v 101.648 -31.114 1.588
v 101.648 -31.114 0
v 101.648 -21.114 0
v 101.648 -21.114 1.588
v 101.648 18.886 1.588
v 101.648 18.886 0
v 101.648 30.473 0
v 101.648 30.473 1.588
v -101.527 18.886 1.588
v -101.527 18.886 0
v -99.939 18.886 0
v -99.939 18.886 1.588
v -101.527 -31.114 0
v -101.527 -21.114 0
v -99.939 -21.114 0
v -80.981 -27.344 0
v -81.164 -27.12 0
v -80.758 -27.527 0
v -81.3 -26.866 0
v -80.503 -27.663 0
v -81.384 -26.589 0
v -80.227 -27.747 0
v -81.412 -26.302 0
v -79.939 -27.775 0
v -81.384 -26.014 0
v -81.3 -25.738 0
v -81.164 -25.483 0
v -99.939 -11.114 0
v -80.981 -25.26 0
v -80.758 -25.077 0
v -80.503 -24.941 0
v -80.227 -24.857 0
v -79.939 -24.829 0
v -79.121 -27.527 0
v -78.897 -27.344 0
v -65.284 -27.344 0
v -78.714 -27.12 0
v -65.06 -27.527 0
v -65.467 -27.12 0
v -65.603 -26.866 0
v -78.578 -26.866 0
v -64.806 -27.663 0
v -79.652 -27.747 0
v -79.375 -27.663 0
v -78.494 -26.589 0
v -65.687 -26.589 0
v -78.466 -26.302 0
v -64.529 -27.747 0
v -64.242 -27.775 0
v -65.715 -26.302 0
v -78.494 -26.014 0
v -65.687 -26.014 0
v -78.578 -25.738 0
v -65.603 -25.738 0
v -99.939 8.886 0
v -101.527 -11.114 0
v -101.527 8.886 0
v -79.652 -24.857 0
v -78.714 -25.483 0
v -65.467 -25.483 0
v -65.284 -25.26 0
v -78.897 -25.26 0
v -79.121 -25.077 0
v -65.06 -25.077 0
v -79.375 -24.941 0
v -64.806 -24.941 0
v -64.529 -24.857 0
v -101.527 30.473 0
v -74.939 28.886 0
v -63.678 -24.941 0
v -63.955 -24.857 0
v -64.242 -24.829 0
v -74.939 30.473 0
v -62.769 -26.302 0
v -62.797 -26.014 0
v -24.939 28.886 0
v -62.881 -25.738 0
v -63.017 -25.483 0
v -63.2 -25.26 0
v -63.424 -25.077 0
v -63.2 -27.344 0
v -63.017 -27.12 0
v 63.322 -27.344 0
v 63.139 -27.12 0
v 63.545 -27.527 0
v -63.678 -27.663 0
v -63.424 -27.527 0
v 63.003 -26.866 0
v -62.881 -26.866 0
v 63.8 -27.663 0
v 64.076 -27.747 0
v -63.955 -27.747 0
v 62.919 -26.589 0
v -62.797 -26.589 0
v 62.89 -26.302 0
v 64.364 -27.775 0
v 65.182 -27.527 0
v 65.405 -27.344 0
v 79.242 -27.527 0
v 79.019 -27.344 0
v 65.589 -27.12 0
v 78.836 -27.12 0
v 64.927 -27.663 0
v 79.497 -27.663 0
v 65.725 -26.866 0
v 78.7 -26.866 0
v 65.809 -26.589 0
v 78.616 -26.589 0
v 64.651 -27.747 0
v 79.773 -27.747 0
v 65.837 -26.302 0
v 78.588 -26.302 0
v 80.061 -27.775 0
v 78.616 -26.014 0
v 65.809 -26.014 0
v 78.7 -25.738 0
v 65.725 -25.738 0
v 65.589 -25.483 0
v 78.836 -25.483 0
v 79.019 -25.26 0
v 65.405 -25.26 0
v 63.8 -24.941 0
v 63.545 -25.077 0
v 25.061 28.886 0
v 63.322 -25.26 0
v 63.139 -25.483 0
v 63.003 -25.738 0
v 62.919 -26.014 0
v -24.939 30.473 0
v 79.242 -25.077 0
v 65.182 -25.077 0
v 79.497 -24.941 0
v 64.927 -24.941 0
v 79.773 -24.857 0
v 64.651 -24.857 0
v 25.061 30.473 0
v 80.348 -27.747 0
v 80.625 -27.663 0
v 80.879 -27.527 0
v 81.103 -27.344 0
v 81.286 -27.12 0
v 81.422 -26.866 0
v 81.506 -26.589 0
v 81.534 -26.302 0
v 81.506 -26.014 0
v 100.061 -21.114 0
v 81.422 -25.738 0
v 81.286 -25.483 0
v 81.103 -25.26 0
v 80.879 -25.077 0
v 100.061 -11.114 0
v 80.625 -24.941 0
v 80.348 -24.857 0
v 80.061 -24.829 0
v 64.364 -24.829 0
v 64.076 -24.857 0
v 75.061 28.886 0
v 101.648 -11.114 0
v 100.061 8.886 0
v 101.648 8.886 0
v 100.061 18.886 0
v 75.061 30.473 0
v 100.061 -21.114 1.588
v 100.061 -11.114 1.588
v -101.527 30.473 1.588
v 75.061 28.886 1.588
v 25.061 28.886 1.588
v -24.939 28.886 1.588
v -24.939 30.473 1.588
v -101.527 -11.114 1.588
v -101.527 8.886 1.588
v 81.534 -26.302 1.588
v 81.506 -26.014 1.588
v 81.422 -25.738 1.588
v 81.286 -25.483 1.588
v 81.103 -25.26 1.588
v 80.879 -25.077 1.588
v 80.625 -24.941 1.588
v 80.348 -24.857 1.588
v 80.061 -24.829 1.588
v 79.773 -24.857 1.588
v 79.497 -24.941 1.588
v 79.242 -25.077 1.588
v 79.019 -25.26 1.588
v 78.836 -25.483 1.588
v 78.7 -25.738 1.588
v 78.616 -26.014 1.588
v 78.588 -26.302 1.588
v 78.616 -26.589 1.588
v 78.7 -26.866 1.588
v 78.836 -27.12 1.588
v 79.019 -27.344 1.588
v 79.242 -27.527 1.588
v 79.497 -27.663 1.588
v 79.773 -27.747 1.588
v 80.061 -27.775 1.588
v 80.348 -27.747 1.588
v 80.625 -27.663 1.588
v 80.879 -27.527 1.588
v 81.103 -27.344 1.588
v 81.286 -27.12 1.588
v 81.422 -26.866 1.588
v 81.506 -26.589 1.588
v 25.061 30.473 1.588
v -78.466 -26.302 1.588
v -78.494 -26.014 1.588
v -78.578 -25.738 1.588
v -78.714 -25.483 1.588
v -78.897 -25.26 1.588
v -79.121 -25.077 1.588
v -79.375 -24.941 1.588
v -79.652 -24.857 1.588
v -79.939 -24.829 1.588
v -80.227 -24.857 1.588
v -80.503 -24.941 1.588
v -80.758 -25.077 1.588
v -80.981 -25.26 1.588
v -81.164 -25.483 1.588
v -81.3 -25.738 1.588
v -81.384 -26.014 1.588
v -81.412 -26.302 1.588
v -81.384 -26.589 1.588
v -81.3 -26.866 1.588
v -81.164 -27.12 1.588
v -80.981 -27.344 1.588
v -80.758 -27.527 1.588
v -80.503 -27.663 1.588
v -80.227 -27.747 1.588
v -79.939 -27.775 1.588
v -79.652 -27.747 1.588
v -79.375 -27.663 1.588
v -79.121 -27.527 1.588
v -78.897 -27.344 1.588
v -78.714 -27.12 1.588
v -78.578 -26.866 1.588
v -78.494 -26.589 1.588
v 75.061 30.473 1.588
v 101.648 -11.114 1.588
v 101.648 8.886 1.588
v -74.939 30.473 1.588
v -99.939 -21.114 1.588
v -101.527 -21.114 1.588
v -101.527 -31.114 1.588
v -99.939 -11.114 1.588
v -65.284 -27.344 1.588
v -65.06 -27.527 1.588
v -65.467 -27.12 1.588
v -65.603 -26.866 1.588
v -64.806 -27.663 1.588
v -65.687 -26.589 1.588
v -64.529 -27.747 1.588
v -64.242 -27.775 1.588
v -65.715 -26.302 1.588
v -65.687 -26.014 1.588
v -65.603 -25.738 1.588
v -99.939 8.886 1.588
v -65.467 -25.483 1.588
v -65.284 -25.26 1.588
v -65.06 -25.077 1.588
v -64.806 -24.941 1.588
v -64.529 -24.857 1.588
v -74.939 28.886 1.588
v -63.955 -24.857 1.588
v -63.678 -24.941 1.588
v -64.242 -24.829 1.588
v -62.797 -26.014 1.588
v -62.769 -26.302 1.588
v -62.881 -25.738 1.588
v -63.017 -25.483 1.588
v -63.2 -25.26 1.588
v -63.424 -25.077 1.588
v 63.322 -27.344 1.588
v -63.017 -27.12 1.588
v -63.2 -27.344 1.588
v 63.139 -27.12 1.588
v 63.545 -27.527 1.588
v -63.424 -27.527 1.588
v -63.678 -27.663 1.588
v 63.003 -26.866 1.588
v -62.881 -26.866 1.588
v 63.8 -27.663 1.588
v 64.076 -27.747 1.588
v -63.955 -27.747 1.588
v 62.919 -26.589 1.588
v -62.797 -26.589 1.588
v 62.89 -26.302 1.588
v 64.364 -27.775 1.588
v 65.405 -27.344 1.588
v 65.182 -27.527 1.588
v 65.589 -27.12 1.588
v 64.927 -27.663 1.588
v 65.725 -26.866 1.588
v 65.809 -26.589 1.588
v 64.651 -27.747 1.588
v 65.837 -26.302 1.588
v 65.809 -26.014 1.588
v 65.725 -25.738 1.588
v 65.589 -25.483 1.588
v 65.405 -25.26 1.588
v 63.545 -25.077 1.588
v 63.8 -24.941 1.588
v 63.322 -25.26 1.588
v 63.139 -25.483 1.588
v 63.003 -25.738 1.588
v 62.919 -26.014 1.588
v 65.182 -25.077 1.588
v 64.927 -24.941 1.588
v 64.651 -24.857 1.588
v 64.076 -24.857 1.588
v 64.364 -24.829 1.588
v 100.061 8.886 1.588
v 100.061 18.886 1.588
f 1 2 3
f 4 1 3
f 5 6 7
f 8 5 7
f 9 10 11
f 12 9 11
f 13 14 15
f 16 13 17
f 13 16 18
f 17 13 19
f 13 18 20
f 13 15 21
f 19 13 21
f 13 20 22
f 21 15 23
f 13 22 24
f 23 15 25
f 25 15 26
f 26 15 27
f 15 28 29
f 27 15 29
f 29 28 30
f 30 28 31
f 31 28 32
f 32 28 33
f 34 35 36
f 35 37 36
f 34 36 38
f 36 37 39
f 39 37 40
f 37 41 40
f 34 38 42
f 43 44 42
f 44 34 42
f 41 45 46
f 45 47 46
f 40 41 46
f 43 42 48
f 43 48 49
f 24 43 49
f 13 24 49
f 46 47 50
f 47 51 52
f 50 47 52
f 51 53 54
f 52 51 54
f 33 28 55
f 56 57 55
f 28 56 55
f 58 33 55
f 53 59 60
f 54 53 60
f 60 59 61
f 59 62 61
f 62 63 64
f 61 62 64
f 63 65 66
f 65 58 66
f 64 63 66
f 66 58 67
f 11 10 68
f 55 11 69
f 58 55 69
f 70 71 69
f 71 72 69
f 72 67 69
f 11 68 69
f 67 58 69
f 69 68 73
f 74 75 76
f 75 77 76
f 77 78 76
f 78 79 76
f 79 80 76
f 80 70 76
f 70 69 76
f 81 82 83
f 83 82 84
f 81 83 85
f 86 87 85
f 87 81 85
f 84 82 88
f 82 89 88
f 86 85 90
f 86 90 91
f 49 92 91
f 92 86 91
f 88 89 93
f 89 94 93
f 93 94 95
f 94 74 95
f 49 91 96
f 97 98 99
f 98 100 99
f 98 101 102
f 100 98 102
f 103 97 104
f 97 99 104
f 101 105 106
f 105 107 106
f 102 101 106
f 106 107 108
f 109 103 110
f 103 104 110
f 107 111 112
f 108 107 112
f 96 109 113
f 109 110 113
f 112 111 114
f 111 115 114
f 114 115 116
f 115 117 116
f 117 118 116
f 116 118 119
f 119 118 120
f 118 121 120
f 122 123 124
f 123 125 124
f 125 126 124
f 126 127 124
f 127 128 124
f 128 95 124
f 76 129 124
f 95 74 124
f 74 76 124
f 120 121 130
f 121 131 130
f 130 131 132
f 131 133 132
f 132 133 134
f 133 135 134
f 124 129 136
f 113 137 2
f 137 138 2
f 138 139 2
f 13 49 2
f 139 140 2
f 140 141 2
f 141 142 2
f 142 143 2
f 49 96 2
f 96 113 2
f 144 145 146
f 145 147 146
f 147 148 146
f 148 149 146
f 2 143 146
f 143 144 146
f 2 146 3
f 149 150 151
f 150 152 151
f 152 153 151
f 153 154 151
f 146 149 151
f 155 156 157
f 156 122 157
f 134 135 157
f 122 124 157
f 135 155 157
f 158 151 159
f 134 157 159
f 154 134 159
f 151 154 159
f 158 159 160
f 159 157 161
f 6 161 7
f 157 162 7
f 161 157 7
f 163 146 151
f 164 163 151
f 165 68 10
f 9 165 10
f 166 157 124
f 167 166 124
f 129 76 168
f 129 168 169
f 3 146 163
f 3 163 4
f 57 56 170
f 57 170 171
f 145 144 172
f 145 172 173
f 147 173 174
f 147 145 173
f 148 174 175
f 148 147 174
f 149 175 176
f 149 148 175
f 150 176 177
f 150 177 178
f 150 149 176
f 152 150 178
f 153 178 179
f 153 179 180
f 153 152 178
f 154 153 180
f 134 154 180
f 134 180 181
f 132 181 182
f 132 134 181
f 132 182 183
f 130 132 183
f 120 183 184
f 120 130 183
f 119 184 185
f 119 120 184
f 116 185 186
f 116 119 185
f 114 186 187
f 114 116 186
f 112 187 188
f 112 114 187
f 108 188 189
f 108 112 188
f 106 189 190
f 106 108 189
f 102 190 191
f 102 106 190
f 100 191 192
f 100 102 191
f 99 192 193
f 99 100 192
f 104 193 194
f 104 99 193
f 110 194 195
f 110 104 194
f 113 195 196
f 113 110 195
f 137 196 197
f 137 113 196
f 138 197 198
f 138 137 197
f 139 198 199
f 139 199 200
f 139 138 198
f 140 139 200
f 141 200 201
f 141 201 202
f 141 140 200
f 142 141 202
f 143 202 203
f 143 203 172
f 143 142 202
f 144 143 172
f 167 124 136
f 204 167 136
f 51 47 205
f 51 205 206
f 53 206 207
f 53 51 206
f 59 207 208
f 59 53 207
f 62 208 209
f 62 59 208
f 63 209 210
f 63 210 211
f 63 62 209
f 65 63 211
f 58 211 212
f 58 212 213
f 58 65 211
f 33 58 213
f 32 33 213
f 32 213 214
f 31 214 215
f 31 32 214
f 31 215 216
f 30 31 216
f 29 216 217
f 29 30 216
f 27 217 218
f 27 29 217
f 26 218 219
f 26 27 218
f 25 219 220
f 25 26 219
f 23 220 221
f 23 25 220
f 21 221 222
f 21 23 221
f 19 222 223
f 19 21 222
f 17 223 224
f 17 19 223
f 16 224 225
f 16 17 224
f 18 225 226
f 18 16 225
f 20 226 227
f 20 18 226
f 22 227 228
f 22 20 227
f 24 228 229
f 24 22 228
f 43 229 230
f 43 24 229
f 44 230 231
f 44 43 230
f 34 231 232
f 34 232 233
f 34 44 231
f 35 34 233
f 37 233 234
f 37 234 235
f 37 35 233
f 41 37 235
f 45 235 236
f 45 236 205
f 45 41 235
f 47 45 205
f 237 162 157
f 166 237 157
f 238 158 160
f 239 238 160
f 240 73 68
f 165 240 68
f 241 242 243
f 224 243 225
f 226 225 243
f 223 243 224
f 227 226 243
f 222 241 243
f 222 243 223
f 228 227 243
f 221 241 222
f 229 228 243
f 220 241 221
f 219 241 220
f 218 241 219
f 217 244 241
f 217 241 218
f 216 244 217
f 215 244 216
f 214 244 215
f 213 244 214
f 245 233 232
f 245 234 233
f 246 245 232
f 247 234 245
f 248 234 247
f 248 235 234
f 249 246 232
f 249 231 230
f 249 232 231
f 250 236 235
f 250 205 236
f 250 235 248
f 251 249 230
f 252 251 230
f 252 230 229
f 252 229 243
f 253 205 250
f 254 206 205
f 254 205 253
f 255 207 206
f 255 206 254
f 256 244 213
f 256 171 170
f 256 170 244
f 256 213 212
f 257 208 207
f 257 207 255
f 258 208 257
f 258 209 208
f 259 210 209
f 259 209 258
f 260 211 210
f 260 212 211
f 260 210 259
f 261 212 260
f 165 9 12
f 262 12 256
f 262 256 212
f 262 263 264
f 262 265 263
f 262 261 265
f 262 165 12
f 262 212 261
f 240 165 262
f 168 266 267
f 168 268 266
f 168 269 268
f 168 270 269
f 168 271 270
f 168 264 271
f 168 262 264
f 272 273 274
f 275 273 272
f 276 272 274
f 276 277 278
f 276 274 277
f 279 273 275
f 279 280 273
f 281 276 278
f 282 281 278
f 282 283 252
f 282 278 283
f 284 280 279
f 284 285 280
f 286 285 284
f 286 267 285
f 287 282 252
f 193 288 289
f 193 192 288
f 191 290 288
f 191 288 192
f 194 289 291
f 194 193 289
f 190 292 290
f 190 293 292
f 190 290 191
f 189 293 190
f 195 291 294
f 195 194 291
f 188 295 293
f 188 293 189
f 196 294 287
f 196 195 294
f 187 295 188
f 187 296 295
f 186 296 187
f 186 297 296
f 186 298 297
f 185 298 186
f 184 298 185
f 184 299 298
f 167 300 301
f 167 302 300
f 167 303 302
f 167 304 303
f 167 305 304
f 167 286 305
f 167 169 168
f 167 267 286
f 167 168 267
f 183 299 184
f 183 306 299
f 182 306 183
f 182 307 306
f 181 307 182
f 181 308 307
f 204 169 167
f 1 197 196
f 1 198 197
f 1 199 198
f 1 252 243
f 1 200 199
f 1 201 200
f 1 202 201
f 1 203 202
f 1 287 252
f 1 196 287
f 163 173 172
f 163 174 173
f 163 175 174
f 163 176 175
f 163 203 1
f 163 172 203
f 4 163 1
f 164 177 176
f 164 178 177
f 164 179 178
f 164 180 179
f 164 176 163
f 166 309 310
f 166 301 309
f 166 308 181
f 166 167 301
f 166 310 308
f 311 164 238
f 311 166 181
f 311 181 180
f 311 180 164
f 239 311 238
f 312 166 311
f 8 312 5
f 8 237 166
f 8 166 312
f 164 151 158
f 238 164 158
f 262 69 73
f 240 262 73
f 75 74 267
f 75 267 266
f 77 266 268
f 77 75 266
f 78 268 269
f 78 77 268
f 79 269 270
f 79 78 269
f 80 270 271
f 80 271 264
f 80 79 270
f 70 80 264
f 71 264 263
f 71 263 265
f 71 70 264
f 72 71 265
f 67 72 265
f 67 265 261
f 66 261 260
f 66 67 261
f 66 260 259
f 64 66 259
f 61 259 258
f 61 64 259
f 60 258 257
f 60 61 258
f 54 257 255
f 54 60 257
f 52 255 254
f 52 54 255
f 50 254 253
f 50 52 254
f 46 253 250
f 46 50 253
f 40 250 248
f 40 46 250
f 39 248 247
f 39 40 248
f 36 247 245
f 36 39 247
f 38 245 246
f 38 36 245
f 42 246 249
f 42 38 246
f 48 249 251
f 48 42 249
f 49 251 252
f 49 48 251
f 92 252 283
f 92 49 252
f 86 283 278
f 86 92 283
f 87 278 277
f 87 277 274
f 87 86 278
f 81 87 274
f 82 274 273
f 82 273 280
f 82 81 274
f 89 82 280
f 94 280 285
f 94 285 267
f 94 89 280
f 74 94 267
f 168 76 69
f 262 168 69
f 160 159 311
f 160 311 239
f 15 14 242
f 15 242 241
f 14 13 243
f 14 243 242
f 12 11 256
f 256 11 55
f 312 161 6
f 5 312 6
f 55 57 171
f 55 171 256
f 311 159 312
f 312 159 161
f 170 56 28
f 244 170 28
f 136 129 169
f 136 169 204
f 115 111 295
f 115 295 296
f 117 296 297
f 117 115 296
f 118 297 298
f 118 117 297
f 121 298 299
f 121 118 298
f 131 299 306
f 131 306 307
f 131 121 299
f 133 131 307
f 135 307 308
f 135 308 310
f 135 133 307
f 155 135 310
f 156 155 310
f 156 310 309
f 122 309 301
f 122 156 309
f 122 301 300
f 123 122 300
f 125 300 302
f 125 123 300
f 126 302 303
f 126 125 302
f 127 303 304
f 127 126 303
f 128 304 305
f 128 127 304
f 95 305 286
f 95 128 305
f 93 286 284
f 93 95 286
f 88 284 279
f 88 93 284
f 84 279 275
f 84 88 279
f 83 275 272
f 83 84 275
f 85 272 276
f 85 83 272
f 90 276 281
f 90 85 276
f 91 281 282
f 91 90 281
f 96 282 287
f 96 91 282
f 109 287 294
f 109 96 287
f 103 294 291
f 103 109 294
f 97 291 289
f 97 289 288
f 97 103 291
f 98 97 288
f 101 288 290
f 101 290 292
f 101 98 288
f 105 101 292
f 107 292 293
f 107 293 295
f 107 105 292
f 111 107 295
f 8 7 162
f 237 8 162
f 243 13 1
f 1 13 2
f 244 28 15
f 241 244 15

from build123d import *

# Parameters (mm, degrees)
F0_W     = 1.5875
F0_H     = 20
F0_H_2   = 10
F0_W_2   = 50
F0_H_3   = 1.5875
F0_W_3   = 200
F0_R     = 1.4732
F1_DEPTH = 1.5875


# Not quite as in the source:
# - a length typed as a fraction of an inch, garbled in the dataset ("3 / 203.2 mm" for 3/8 in), is restored


with BuildPart() as f1:
    # F0 (on Top) → F1 (new body)
    with BuildSketch(Plane.XY):
        with Locations((100.8545614919, -1.1143145161)):
            Rectangle(F0_W, F0_H)
        with Locations((-100.7329385081, -1.1143145161)):
            Rectangle(F0_W, F0_H)
        with Locations((-100.7329385081, -26.1143145161)):
            Rectangle(F0_W, F0_H_2)
        with Locations((100.8545614919, 23.8856854839)):
            Rectangle(F0_W, F0_H_2)
        with Locations((-100.7329385081, 23.8856854839)):
            Rectangle(F0_W, F0_H_2)
        with Locations((100.8545614919, -26.1143145161)):
            Rectangle(F0_W, F0_H_2)
        Polygon((75.0608114919, 28.8856854839), (100.0608114919, 28.8856854839), (101.6483114919, 28.8856854839), (101.6483114919, 30.4731854839), (75.0608114919, 30.4731854839), align=None)
        with Locations((0.0608114919, 29.6794354839)):
            Rectangle(F0_W_2, F0_H_3)
        Polygon((-101.5266885081, 28.8856854839), (-99.9391885081, 28.8856854839), (-74.9391885081, 28.8856854839), (-74.9391885081, 30.4731854839), (-101.5266885081, 30.4731854839), align=None)
        Polygon((100.0608114919, 8.8856854839), (100.0608114919, 18.8856854839), (-99.9391885081, 18.8856854839), (-99.9391885081, 8.8856854839), (-99.9391885081, -11.1143145161), (-99.9391885081, -21.1143145161), (100.0608114919, -21.1143145161), (100.0608114919, -11.1143145161), align=None)
        with Locations((0.0608114919, -26.1143145161)):
            Rectangle(F0_W_3, F0_H_2)
        with Locations((-79.9391885081, -26.3018145161)):
            Circle(F0_R, mode=Mode.SUBTRACT)
        with Locations((-64.2419885081, -26.3018145161)):
            Circle(F0_R, mode=Mode.SUBTRACT)
        with Locations((64.3636114919, -26.3018145161)):
            Circle(F0_R, mode=Mode.SUBTRACT)
        with Locations((80.0608114919, -26.3018145161)):
            Circle(F0_R, mode=Mode.SUBTRACT)
        Polygon((-99.9391885081, 18.8856854839), (100.0608114919, 18.8856854839), (100.0608114919, 28.8856854839), (75.0608114919, 28.8856854839), (25.0608114919, 28.8856854839), (-24.9391885081, 28.8856854839), (-74.9391885081, 28.8856854839), (-99.9391885081, 28.8856854839), align=None)
    extrude(amount=F1_DEPTH)


solid = f1.part
